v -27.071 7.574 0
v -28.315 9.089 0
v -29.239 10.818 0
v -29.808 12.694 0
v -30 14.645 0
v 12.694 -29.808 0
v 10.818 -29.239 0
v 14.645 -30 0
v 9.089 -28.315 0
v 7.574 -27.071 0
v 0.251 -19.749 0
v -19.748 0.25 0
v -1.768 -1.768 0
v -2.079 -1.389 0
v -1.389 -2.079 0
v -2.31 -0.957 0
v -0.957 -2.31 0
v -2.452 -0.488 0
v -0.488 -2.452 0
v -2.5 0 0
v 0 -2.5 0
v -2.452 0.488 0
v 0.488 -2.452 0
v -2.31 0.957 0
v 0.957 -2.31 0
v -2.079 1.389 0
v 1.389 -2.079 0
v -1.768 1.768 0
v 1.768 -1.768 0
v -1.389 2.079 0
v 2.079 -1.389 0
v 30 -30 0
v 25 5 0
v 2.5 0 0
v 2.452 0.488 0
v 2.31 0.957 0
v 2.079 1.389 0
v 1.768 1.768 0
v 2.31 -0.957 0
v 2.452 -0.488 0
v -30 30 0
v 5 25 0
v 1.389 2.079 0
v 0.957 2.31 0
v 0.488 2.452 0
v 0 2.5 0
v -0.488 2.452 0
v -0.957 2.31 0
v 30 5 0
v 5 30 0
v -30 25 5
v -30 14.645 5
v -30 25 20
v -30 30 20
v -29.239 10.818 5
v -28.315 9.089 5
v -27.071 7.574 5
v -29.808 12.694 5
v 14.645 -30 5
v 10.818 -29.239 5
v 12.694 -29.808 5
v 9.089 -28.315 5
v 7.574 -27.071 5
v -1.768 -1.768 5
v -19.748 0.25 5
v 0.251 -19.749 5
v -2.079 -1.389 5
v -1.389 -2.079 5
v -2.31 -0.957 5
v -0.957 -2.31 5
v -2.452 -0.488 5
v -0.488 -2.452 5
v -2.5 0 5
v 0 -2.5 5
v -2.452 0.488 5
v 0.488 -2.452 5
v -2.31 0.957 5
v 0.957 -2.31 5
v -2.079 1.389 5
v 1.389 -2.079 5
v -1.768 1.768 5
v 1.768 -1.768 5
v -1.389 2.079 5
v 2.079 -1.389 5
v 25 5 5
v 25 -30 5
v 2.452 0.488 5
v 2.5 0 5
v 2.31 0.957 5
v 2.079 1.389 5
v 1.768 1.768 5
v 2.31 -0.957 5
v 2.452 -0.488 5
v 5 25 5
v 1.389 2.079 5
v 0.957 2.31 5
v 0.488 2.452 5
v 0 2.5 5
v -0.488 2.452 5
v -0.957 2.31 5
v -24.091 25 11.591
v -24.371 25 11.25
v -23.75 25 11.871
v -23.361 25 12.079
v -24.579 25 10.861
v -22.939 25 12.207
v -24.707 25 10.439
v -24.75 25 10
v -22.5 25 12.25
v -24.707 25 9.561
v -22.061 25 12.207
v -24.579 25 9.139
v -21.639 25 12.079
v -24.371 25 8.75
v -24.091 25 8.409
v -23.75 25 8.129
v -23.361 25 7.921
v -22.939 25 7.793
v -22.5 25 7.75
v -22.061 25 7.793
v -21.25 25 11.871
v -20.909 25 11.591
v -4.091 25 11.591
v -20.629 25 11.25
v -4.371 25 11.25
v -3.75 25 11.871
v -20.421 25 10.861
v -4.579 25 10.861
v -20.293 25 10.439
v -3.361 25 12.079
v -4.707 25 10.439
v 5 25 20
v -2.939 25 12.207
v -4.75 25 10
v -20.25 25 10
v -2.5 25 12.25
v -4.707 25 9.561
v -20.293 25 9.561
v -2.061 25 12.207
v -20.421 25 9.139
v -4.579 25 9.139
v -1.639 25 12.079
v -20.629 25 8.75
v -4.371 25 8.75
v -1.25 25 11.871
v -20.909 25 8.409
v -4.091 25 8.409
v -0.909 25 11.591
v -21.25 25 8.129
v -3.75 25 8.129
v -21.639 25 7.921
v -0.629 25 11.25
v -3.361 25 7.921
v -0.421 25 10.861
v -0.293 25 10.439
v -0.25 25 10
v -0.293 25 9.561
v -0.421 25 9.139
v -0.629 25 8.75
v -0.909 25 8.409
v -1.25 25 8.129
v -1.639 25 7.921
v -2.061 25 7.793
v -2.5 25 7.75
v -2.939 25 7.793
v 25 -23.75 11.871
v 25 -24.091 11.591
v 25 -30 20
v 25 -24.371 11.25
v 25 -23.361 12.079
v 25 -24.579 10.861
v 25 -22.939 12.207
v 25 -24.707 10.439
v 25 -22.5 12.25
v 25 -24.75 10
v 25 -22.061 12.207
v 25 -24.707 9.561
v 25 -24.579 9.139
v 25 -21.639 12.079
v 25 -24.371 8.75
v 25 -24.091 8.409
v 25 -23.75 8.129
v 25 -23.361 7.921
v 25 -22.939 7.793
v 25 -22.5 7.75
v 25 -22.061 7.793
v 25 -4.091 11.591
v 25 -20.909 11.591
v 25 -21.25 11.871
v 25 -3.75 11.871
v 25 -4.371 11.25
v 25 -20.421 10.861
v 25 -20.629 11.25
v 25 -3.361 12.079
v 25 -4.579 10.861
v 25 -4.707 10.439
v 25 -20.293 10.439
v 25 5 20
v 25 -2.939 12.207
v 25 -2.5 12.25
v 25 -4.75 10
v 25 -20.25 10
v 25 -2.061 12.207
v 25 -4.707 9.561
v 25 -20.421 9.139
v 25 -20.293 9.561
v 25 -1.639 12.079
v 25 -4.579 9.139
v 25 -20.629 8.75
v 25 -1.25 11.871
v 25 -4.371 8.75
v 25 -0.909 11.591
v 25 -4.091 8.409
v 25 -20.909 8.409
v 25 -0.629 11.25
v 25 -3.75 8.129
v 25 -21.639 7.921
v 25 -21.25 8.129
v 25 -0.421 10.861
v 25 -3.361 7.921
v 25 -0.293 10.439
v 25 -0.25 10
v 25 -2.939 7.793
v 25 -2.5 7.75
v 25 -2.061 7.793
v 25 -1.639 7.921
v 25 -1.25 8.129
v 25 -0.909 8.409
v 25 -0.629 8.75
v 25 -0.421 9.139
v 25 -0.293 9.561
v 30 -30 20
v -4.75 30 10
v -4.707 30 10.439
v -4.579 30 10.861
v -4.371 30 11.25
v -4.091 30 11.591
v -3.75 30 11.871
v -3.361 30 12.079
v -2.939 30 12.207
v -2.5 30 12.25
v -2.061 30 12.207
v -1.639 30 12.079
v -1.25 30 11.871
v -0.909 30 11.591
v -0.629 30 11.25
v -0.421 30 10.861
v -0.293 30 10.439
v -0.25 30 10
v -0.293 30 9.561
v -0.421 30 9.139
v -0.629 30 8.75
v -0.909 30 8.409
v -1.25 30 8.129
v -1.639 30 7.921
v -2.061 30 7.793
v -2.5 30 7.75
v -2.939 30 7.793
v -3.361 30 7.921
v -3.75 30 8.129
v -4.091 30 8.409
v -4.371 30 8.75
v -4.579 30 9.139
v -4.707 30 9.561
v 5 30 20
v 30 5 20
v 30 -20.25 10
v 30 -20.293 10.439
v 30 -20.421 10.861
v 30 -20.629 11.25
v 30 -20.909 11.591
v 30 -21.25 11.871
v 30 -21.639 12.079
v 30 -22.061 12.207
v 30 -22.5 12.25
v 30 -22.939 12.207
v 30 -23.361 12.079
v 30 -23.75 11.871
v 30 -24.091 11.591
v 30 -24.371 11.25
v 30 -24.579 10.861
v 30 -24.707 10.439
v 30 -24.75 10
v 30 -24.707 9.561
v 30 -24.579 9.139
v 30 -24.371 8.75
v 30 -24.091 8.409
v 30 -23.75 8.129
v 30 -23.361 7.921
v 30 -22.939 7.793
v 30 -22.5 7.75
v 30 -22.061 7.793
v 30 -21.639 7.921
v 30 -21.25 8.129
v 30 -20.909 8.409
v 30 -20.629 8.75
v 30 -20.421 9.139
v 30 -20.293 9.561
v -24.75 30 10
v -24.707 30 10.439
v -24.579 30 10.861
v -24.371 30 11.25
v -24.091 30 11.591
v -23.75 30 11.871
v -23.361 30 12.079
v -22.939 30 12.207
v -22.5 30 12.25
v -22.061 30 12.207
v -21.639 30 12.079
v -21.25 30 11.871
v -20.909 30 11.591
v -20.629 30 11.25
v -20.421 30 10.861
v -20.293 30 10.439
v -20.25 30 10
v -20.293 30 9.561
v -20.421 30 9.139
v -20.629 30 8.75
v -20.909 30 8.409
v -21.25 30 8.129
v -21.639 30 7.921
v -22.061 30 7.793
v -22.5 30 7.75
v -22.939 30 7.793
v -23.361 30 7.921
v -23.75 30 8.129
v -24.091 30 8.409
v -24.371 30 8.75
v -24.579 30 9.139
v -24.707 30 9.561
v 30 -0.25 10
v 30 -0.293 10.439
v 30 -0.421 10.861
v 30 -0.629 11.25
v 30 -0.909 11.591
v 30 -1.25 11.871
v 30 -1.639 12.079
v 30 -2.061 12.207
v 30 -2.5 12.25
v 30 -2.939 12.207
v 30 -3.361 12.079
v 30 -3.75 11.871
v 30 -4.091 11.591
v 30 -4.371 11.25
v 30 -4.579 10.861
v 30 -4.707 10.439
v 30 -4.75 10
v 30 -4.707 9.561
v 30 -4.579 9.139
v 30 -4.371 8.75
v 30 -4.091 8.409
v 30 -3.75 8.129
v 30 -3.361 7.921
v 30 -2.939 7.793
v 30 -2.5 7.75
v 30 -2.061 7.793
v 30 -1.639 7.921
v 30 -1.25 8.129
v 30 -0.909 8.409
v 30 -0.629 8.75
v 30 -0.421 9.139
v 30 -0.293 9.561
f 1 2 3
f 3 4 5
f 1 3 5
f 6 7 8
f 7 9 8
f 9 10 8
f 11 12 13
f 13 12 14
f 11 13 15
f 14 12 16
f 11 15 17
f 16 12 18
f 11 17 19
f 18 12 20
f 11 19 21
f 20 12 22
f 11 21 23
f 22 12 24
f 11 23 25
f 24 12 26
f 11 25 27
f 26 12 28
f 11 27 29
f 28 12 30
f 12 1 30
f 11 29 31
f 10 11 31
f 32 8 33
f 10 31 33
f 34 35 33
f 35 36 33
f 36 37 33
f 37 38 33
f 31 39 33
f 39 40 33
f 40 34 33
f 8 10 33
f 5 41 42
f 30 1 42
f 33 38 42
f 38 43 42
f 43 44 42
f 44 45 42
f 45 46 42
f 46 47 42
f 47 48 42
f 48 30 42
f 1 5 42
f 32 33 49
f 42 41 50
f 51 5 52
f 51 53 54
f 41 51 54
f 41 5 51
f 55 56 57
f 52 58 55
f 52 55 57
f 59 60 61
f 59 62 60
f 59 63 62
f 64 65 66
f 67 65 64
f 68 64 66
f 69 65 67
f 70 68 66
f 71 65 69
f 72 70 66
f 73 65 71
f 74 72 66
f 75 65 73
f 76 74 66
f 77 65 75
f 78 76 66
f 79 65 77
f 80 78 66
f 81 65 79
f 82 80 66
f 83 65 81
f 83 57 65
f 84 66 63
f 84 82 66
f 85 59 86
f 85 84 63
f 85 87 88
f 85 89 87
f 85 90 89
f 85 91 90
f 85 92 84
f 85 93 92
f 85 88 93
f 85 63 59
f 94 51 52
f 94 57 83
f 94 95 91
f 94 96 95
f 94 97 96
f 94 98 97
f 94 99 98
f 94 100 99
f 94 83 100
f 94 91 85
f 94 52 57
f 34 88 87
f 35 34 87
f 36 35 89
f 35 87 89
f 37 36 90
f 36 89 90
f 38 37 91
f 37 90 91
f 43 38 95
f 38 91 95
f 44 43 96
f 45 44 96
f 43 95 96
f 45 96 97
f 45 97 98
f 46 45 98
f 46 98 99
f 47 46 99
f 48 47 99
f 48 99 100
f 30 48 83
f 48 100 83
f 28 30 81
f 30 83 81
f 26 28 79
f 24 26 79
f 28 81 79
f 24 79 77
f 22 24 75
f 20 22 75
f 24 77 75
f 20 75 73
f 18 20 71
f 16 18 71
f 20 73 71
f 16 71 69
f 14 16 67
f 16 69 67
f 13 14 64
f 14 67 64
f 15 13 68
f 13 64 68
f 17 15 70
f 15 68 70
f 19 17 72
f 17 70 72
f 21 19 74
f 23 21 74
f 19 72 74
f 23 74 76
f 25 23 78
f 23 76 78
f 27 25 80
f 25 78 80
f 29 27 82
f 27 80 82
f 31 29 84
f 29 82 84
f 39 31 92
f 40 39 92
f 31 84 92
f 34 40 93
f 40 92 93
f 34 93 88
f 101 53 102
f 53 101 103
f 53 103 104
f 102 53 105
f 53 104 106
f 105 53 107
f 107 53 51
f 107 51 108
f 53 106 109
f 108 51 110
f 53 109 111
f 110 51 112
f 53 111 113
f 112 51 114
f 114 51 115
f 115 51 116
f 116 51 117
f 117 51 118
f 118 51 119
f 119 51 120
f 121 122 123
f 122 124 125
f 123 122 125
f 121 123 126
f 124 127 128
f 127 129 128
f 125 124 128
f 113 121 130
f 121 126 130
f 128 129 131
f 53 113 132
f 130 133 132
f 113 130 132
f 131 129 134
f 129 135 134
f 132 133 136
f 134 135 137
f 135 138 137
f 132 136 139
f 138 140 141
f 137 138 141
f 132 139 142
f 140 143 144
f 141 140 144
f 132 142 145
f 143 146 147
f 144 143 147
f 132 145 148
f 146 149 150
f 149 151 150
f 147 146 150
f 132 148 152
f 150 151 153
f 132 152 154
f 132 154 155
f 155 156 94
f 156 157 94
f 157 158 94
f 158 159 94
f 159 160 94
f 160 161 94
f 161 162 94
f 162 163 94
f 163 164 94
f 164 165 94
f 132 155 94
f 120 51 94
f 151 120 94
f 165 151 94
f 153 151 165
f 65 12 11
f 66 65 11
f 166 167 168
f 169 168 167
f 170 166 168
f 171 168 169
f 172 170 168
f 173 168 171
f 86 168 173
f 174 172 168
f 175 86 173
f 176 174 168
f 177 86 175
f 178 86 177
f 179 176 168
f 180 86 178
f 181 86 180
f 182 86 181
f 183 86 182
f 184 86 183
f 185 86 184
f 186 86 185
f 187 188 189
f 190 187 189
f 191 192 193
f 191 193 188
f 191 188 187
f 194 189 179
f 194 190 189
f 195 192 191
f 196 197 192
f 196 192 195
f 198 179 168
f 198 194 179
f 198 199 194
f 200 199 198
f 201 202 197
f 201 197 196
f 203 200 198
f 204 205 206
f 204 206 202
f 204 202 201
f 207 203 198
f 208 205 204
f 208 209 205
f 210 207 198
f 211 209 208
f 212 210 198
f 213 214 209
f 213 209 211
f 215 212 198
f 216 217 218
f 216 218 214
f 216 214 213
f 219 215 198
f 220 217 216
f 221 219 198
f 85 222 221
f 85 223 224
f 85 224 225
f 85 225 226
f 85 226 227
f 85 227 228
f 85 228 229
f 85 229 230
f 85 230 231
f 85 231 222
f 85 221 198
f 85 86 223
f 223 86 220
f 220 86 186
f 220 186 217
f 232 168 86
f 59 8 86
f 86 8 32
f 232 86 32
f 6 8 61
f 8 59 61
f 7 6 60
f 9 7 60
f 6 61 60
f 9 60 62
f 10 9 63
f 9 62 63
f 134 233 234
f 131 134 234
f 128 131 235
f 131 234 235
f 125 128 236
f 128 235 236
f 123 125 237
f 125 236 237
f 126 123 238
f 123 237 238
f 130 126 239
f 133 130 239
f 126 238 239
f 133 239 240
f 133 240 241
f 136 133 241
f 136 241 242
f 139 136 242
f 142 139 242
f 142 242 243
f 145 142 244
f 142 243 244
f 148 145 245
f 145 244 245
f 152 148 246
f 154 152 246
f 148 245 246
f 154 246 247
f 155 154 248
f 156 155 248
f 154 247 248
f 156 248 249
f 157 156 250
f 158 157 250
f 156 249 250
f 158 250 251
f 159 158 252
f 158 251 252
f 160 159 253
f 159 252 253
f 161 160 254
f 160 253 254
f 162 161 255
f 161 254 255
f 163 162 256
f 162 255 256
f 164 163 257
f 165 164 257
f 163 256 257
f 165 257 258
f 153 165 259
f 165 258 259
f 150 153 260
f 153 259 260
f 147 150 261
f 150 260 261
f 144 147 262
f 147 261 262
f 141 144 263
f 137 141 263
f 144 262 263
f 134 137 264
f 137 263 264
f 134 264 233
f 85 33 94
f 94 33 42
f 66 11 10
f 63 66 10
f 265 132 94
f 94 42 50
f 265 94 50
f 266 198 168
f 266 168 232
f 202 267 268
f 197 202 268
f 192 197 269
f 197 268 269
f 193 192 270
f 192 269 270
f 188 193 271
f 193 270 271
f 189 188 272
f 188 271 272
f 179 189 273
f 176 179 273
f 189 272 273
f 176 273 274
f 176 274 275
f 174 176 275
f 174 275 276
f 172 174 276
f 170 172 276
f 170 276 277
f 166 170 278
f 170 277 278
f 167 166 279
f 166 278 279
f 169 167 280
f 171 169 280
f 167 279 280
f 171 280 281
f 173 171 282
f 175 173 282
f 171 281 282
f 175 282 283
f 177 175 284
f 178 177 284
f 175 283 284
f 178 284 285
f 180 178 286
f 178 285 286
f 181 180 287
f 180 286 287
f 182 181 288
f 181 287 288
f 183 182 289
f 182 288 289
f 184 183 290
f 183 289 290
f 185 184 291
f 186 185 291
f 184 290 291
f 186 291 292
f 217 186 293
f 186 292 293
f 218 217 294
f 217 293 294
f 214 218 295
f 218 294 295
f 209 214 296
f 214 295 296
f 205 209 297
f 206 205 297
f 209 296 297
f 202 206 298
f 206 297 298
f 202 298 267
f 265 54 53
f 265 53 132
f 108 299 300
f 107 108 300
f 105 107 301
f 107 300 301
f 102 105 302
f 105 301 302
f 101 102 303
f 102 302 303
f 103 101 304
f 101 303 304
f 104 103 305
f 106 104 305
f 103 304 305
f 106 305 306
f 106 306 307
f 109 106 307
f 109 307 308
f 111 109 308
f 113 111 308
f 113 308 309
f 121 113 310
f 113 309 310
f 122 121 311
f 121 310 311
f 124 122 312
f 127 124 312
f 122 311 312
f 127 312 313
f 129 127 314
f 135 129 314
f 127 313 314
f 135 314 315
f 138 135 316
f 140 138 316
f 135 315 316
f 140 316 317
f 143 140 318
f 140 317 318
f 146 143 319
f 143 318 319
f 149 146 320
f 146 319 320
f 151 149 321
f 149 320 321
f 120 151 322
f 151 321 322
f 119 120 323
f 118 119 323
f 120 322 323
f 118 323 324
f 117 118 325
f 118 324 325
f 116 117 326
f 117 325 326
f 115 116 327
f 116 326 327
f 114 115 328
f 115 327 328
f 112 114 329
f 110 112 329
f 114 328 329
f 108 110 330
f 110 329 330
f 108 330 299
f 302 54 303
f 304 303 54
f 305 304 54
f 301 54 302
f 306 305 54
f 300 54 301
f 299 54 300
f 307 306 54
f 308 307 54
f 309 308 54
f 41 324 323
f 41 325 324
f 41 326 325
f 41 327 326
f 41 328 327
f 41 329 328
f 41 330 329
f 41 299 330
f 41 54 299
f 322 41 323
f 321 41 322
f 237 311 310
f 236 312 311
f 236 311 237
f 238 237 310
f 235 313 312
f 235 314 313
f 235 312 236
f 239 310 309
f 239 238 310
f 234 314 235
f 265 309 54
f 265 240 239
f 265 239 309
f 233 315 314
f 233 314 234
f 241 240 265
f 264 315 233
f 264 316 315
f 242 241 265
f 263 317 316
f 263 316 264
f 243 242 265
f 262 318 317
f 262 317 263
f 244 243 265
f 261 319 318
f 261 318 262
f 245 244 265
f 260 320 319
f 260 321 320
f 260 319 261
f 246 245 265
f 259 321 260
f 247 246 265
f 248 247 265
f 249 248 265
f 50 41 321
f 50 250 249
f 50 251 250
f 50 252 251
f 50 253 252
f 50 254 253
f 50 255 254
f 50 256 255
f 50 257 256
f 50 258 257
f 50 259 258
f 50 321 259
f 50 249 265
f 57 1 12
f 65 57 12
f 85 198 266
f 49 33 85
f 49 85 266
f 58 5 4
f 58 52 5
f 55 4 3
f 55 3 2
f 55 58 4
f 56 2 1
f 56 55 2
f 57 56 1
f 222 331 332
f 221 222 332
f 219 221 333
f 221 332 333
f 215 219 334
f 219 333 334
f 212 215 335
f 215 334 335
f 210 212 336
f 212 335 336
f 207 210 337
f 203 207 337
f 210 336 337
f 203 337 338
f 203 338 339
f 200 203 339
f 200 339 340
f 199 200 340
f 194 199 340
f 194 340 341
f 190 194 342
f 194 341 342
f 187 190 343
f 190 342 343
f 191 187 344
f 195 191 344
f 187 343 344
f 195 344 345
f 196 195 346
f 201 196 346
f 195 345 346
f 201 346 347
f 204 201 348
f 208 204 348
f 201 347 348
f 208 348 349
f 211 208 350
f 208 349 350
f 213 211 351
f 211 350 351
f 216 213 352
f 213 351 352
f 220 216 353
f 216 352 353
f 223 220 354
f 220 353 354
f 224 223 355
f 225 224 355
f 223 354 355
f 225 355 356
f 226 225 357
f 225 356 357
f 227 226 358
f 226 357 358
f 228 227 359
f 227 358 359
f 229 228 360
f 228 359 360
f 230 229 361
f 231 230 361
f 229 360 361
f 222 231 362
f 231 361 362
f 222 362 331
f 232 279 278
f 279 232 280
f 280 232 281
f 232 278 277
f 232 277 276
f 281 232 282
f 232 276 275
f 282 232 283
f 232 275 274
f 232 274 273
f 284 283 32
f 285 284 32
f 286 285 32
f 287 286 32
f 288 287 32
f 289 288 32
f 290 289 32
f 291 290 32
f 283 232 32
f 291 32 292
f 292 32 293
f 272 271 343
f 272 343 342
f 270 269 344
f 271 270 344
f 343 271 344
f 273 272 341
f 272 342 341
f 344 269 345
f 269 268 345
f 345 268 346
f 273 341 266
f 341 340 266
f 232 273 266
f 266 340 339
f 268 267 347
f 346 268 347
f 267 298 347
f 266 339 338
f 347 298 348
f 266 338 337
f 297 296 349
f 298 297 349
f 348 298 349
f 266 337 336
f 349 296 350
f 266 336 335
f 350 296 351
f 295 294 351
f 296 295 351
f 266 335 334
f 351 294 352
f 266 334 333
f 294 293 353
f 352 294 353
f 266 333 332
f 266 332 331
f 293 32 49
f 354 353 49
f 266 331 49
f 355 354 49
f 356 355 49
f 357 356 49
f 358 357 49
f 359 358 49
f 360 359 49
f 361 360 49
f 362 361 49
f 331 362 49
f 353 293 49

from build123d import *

# Parameters (mm, degrees)
F0_W     = 35
F0_H     = 5
F0_W_2   = 5
F0_H_2   = 35
F1_DEPTH = 5
F2_W     = 35
F2_H     = 5
F2_W_2   = 5
F2_H_2   = 35
F3_DEPTH = 15
F4_R     = 2.5
F5_DEPTH = 5
F6_R     = 2.25
F7_DEPTH = 5
F8_R     = 2.25
F9_DEPTH = 5
F10_R    = 10


with BuildPart() as f1:
    # F0 (on Top) → F1 (new body)
    with BuildSketch(Plane.XY):
        Polygon((10.502526, -30), (25, -30), (25, 5), (5, 25), (-30, 25), (-30, 10.502526), (-19.747754, 0.250279), (0.251263, -19.748737), align=None)
        with Locations((-12.5, 27.5)):
            Rectangle(F0_W, F0_H)
        with Locations((27.5, -12.5)):
            Rectangle(F0_W_2, F0_H_2)
    extrude(amount=F1_DEPTH)

    # F2 (on face) → F3 (join)
    with BuildSketch(Plane.XY.offset(5)):
        with Locations((-12.5, 27.5)):
            Rectangle(F2_W, F2_H)
        with Locations((27.5, -12.5)):
            Rectangle(F2_W_2, F2_H_2)
    extrude(amount=F3_DEPTH)

    # F4 (on face) → F5 (cut, through all)
    with BuildSketch(Plane.XY.offset(5)):
        Circle(F4_R)
    extrude(amount=-F5_DEPTH, mode=Mode.SUBTRACT)

    # F6 (on face) → F7 (cut, through all)
    with BuildSketch(Plane.YZ.offset(30)):
        with Locations((-22.5, 10)):
            Circle(F6_R)
        with Locations((-2.5, 10)):
            Circle(F6_R)
    extrude(amount=-F7_DEPTH, mode=Mode.SUBTRACT)

    # F8 (on face) → F9 (cut, through all)
    with BuildSketch(Plane(origin=(0, 30, 0), x_dir=(-1, 0, 0), z_dir=(0, 1, 0))):
        with Locations((2.5, 10)):
            Circle(F8_R)
        with Locations((22.5, 10)):
            Circle(F8_R)
    extrude(amount=-F9_DEPTH, mode=Mode.SUBTRACT)

    # F10
    f10_edges = [f1.edges().sort_by_distance(p)[0] for p in [
        (-30, 10.502526, 2.5),
        (10.502526, -30, 2.5),
    ]]
    fillet(f10_edges, radius=F10_R)


solid = f1.part
